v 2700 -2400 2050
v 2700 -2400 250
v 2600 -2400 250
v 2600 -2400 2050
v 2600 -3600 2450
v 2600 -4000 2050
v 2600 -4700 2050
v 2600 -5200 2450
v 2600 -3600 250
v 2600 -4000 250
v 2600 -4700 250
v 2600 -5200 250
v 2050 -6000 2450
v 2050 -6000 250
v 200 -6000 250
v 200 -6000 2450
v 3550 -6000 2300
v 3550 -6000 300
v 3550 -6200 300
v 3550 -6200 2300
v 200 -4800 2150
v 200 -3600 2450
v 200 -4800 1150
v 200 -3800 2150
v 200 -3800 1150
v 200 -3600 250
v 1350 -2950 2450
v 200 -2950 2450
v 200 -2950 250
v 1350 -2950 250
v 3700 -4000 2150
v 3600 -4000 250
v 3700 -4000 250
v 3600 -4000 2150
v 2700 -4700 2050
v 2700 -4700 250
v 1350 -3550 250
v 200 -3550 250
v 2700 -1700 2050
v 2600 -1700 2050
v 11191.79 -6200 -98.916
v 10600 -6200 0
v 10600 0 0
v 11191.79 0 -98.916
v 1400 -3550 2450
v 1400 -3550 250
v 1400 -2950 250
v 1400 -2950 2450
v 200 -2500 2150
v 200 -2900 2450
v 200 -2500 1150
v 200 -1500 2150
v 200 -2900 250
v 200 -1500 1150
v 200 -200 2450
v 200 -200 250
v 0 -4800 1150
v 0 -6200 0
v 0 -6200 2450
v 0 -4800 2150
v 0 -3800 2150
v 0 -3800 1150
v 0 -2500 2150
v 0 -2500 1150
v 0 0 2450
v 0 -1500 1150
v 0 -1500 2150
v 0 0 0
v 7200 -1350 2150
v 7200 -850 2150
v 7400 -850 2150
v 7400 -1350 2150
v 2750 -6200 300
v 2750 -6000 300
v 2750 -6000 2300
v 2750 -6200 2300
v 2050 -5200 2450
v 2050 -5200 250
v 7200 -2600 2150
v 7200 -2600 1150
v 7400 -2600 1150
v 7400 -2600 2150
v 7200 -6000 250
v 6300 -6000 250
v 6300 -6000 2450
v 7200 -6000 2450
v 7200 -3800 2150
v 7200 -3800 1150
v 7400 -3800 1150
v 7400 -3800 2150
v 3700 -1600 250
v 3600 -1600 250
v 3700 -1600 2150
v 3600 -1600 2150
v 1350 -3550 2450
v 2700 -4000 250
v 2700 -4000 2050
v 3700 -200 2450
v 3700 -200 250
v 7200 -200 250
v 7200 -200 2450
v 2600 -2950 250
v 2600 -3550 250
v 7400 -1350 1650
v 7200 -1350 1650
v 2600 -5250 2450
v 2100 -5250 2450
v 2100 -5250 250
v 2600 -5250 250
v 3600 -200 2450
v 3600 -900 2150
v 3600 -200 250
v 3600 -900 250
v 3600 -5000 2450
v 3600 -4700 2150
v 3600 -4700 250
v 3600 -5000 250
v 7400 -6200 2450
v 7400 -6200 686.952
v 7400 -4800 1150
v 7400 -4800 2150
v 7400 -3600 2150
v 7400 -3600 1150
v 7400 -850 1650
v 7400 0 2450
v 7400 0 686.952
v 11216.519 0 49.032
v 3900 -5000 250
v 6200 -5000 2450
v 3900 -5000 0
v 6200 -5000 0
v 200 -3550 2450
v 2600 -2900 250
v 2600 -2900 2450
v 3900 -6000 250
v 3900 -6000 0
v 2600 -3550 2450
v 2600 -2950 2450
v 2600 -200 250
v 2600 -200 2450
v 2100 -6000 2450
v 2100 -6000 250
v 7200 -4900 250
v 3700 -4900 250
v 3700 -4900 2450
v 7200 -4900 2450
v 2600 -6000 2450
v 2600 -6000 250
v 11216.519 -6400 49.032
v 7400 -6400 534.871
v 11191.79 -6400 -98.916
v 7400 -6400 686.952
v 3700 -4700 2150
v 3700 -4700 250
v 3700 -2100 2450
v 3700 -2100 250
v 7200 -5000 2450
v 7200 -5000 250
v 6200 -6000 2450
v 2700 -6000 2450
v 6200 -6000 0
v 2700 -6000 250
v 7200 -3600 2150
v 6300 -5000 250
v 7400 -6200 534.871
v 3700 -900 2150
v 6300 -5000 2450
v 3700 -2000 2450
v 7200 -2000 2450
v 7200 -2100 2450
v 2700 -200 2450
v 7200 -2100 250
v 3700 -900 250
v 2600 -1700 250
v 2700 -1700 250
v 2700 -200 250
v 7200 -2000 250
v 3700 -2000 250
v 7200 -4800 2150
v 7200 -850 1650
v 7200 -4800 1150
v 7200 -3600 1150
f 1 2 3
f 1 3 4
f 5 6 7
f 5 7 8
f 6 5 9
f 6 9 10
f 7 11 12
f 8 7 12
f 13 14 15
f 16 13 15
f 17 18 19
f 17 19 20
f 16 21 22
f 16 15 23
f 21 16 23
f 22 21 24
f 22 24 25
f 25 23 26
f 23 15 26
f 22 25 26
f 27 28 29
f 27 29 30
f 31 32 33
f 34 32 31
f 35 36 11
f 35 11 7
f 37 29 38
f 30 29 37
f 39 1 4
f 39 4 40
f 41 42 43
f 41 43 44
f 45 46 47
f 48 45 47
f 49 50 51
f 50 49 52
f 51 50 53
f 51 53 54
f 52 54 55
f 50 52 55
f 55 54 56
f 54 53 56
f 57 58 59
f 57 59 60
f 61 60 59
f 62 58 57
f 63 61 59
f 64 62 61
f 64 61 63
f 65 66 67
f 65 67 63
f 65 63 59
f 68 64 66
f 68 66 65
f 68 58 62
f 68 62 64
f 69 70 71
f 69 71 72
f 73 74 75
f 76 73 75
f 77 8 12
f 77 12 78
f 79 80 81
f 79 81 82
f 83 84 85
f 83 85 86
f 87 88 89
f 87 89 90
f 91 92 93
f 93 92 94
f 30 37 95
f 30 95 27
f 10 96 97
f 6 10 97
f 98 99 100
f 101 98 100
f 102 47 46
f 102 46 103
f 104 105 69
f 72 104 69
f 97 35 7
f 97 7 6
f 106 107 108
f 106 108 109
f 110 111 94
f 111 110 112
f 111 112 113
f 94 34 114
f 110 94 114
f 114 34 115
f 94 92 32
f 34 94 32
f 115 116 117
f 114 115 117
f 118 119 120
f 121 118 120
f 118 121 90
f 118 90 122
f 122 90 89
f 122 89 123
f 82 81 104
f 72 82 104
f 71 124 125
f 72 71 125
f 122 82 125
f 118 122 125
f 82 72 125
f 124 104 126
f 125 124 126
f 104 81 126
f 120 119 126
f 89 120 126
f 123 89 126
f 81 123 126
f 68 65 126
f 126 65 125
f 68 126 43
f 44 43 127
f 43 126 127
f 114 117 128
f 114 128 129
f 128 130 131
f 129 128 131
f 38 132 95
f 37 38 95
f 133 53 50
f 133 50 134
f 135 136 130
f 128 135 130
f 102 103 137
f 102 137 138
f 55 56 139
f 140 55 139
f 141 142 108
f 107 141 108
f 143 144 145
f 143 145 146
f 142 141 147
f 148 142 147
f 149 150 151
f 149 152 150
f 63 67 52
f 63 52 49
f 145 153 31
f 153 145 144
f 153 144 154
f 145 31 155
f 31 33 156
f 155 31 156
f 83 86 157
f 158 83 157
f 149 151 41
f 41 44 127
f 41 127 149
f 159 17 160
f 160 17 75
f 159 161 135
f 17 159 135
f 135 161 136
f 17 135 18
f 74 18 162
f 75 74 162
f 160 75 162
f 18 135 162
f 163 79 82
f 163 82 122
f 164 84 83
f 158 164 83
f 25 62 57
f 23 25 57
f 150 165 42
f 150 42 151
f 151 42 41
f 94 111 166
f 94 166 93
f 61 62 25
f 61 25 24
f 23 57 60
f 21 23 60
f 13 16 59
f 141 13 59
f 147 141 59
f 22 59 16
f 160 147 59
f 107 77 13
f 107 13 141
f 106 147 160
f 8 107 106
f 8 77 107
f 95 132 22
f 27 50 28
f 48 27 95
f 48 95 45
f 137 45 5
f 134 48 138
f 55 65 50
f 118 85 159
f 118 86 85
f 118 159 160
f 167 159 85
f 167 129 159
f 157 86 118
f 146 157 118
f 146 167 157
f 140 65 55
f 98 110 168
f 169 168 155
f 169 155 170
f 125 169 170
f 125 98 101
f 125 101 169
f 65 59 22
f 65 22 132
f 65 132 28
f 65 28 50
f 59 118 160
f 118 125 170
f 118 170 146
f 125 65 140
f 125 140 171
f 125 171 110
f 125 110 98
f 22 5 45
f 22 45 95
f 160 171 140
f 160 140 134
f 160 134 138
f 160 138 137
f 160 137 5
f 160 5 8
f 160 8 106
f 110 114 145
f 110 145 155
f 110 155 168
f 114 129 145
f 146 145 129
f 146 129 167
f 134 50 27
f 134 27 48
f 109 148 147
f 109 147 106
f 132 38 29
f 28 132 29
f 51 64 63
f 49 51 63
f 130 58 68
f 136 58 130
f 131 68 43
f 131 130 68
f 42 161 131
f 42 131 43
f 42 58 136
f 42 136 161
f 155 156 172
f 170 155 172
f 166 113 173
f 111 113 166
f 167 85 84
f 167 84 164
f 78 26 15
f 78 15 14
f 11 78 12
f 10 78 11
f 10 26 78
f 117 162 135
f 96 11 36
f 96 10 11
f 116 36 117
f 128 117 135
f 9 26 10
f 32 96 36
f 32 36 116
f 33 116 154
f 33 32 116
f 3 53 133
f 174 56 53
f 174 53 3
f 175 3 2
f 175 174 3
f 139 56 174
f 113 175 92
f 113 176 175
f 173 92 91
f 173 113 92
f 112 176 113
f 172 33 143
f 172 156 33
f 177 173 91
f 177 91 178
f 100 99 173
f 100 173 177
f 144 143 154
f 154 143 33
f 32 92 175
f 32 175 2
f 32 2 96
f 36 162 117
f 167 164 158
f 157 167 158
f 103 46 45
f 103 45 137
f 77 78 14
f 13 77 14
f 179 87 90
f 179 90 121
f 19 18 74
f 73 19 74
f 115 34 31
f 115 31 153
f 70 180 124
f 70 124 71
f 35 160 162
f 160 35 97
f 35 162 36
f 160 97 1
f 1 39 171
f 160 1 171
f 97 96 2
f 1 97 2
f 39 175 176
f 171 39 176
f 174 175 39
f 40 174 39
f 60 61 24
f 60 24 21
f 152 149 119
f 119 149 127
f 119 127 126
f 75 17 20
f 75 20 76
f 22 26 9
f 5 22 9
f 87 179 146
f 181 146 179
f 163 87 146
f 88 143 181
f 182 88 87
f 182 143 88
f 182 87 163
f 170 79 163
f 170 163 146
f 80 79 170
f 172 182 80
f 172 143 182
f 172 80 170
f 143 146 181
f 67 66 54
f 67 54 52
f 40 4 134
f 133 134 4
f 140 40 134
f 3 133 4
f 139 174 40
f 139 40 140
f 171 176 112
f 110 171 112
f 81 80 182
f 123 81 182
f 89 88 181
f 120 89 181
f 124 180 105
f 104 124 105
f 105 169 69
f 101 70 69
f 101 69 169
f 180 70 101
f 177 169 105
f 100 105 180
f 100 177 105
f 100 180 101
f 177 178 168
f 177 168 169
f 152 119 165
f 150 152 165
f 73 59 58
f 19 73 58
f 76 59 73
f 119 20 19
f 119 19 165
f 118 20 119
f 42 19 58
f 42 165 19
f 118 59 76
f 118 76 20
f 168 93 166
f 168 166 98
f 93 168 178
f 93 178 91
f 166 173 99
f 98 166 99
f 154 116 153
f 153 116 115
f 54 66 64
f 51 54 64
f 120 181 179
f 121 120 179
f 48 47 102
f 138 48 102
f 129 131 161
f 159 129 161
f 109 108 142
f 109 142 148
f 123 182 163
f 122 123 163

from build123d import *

# Parameters (mm, degrees)
F0_W      = 7400
F0_H      = 6200
F0_W_2    = 2300
F0_H_2    = 1000
F1_DEPTH  = 250
F2_W      = 7400
F2_H      = 6200
F2_W_2    = 500
F2_H_2    = 750
F2_W_3    = 1150
F2_H_3    = 600
F2_W_4    = 1200
F2_W_5    = 900
F2_H_4    = 1000
F2_W_6    = 3500
F2_H_5    = 2800
F2_W_7    = 2400
F2_H_6    = 2700
F2_H_7    = 1800
F3_DEPTH  = 2200
F5_DEPTH  = 6200
F6_W      = 700
F6_H      = 1800
F7_DEPTH  = 100
F8_W      = 700
F8_H      = 1900
F9_DEPTH  = 100
F10_W     = 1000
F10_H     = 1000
F10_W_2   = 500
F10_H_2   = 500
F11_DEPTH = 200
F12_W     = 1000
F12_H     = 1000
F13_DEPTH = 200
F14_W     = 800
F14_H     = 2000
F15_DEPTH = 200
F17_DEPTH = 200


with BuildPart() as f1:
    # F0 (on Top) → F1 (new body)
    with BuildSketch(Plane.XY):
        with Locations((3700, -3100)):
            Rectangle(F0_W, F0_H)
        with Locations((5050, -5500)):
            Rectangle(F0_W_2, F0_H_2, mode=Mode.SUBTRACT)
    extrude(amount=F1_DEPTH)

    # F2 (on face) → F3 (join)
    with BuildSketch(Plane.XY.offset(250)):
        with Locations((3700, -3100)):
            Rectangle(F2_W, F2_H)
        Polygon((2050, -6000), (200, -6000), (200, -3600), (2600, -3600), (2600, -5200), (2050, -5200), align=None, mode=Mode.SUBTRACT)
        with Locations((2350, -5625)):
            Rectangle(F2_W_2, F2_H_2, mode=Mode.SUBTRACT)
        with Locations((775, -3250)):
            Rectangle(F2_W_3, F2_H_3, mode=Mode.SUBTRACT)
        with Locations((2000, -3250)):
            Rectangle(F2_W_4, F2_H_3, mode=Mode.SUBTRACT)
        with Locations((6750, -5500)):
            Rectangle(F2_W_5, F2_H_4, mode=Mode.SUBTRACT)
        with Locations((5450, -3500)):
            Rectangle(F2_W_6, F2_H_5, mode=Mode.SUBTRACT)
        with Locations((1400, -1550)):
            Rectangle(F2_W_7, F2_H_6, mode=Mode.SUBTRACT)
        Polygon((6200, -6000), (2700, -6000), (2700, -200), (3600, -200), (3600, -5000), (6200, -5000), align=None, mode=Mode.SUBTRACT)
        with Locations((5450, -1100)):
            Rectangle(F2_W_6, F2_H_7, mode=Mode.SUBTRACT)
    extrude(amount=F3_DEPTH)

    # F4 (on face) → F5 (join, through all)
    with BuildSketch(Plane.XZ.offset(6200)):
        Polygon((7400, 0), (10600, 0), (11191.790179, -98.916043), (11216.51919, 49.031502), (7400, 686.951816), align=None)
    extrude(amount=-F5_DEPTH)

    # F6 (on face) → F7 (cut, through all)
    with BuildSketch(Plane.YZ.offset(2700)):
        with Locations((-4350, 1150)):
            Rectangle(F6_W, F6_H)
        with Locations((-2050, 1150)):
            Rectangle(F6_W, F6_H)
    extrude(amount=-F7_DEPTH, mode=Mode.SUBTRACT)

    # F8 (on face) → F9 (cut, through all)
    with BuildSketch(Plane(origin=(3600, 0, 0), x_dir=(0, -1, 0), z_dir=(-1, 0, 0))):
        with Locations((1250, 1200)):
            Rectangle(F8_W, F8_H)
        with Locations((4350, 1200)):
            Rectangle(F8_W, F8_H)
    extrude(amount=-F9_DEPTH, mode=Mode.SUBTRACT)

    # F10 (on face) → F11 (cut, through all)
    with BuildSketch(Plane(origin=(7200, 0, 0), x_dir=(0, -1, 0), z_dir=(-1, 0, 0))):
        with Locations((3100, 1650)):
            Rectangle(F10_W, F10_H)
        with Locations((4300, 1650)):
            Rectangle(F10_W, F10_H)
        with Locations((1100, 1900)):
            Rectangle(F10_W_2, F10_H_2)
    extrude(amount=-F11_DEPTH, mode=Mode.SUBTRACT)

    # F12 (on face) → F13 (cut, through all)
    with BuildSketch(Plane(origin=(0, 0, 0), x_dir=(0, -1, 0), z_dir=(-1, 0, 0))):
        with Locations((2000, 1650)):
            Rectangle(F12_W, F12_H)
        with Locations((4300, 1650)):
            Rectangle(F12_W, F12_H)
    extrude(amount=-F13_DEPTH, mode=Mode.SUBTRACT)

    # F14 (on face) → F15 (cut, through all)
    with BuildSketch(Plane(origin=(0, -6000, 0), x_dir=(-1, 0, 0), z_dir=(0, 1, 0))):
        with Locations((-3150, 1300)):
            Rectangle(F14_W, F14_H)
    extrude(amount=-F15_DEPTH, mode=Mode.SUBTRACT)

    # F16 (on face) → F17 (join)
    with BuildSketch(Plane.XZ.offset(6200)):
        Polygon((7400, 534.870888), (11191.790179, -98.916043), (11216.51919, 49.031502), (7400, 686.951816), align=None)
    extrude(amount=F17_DEPTH)


solid = f1.part
